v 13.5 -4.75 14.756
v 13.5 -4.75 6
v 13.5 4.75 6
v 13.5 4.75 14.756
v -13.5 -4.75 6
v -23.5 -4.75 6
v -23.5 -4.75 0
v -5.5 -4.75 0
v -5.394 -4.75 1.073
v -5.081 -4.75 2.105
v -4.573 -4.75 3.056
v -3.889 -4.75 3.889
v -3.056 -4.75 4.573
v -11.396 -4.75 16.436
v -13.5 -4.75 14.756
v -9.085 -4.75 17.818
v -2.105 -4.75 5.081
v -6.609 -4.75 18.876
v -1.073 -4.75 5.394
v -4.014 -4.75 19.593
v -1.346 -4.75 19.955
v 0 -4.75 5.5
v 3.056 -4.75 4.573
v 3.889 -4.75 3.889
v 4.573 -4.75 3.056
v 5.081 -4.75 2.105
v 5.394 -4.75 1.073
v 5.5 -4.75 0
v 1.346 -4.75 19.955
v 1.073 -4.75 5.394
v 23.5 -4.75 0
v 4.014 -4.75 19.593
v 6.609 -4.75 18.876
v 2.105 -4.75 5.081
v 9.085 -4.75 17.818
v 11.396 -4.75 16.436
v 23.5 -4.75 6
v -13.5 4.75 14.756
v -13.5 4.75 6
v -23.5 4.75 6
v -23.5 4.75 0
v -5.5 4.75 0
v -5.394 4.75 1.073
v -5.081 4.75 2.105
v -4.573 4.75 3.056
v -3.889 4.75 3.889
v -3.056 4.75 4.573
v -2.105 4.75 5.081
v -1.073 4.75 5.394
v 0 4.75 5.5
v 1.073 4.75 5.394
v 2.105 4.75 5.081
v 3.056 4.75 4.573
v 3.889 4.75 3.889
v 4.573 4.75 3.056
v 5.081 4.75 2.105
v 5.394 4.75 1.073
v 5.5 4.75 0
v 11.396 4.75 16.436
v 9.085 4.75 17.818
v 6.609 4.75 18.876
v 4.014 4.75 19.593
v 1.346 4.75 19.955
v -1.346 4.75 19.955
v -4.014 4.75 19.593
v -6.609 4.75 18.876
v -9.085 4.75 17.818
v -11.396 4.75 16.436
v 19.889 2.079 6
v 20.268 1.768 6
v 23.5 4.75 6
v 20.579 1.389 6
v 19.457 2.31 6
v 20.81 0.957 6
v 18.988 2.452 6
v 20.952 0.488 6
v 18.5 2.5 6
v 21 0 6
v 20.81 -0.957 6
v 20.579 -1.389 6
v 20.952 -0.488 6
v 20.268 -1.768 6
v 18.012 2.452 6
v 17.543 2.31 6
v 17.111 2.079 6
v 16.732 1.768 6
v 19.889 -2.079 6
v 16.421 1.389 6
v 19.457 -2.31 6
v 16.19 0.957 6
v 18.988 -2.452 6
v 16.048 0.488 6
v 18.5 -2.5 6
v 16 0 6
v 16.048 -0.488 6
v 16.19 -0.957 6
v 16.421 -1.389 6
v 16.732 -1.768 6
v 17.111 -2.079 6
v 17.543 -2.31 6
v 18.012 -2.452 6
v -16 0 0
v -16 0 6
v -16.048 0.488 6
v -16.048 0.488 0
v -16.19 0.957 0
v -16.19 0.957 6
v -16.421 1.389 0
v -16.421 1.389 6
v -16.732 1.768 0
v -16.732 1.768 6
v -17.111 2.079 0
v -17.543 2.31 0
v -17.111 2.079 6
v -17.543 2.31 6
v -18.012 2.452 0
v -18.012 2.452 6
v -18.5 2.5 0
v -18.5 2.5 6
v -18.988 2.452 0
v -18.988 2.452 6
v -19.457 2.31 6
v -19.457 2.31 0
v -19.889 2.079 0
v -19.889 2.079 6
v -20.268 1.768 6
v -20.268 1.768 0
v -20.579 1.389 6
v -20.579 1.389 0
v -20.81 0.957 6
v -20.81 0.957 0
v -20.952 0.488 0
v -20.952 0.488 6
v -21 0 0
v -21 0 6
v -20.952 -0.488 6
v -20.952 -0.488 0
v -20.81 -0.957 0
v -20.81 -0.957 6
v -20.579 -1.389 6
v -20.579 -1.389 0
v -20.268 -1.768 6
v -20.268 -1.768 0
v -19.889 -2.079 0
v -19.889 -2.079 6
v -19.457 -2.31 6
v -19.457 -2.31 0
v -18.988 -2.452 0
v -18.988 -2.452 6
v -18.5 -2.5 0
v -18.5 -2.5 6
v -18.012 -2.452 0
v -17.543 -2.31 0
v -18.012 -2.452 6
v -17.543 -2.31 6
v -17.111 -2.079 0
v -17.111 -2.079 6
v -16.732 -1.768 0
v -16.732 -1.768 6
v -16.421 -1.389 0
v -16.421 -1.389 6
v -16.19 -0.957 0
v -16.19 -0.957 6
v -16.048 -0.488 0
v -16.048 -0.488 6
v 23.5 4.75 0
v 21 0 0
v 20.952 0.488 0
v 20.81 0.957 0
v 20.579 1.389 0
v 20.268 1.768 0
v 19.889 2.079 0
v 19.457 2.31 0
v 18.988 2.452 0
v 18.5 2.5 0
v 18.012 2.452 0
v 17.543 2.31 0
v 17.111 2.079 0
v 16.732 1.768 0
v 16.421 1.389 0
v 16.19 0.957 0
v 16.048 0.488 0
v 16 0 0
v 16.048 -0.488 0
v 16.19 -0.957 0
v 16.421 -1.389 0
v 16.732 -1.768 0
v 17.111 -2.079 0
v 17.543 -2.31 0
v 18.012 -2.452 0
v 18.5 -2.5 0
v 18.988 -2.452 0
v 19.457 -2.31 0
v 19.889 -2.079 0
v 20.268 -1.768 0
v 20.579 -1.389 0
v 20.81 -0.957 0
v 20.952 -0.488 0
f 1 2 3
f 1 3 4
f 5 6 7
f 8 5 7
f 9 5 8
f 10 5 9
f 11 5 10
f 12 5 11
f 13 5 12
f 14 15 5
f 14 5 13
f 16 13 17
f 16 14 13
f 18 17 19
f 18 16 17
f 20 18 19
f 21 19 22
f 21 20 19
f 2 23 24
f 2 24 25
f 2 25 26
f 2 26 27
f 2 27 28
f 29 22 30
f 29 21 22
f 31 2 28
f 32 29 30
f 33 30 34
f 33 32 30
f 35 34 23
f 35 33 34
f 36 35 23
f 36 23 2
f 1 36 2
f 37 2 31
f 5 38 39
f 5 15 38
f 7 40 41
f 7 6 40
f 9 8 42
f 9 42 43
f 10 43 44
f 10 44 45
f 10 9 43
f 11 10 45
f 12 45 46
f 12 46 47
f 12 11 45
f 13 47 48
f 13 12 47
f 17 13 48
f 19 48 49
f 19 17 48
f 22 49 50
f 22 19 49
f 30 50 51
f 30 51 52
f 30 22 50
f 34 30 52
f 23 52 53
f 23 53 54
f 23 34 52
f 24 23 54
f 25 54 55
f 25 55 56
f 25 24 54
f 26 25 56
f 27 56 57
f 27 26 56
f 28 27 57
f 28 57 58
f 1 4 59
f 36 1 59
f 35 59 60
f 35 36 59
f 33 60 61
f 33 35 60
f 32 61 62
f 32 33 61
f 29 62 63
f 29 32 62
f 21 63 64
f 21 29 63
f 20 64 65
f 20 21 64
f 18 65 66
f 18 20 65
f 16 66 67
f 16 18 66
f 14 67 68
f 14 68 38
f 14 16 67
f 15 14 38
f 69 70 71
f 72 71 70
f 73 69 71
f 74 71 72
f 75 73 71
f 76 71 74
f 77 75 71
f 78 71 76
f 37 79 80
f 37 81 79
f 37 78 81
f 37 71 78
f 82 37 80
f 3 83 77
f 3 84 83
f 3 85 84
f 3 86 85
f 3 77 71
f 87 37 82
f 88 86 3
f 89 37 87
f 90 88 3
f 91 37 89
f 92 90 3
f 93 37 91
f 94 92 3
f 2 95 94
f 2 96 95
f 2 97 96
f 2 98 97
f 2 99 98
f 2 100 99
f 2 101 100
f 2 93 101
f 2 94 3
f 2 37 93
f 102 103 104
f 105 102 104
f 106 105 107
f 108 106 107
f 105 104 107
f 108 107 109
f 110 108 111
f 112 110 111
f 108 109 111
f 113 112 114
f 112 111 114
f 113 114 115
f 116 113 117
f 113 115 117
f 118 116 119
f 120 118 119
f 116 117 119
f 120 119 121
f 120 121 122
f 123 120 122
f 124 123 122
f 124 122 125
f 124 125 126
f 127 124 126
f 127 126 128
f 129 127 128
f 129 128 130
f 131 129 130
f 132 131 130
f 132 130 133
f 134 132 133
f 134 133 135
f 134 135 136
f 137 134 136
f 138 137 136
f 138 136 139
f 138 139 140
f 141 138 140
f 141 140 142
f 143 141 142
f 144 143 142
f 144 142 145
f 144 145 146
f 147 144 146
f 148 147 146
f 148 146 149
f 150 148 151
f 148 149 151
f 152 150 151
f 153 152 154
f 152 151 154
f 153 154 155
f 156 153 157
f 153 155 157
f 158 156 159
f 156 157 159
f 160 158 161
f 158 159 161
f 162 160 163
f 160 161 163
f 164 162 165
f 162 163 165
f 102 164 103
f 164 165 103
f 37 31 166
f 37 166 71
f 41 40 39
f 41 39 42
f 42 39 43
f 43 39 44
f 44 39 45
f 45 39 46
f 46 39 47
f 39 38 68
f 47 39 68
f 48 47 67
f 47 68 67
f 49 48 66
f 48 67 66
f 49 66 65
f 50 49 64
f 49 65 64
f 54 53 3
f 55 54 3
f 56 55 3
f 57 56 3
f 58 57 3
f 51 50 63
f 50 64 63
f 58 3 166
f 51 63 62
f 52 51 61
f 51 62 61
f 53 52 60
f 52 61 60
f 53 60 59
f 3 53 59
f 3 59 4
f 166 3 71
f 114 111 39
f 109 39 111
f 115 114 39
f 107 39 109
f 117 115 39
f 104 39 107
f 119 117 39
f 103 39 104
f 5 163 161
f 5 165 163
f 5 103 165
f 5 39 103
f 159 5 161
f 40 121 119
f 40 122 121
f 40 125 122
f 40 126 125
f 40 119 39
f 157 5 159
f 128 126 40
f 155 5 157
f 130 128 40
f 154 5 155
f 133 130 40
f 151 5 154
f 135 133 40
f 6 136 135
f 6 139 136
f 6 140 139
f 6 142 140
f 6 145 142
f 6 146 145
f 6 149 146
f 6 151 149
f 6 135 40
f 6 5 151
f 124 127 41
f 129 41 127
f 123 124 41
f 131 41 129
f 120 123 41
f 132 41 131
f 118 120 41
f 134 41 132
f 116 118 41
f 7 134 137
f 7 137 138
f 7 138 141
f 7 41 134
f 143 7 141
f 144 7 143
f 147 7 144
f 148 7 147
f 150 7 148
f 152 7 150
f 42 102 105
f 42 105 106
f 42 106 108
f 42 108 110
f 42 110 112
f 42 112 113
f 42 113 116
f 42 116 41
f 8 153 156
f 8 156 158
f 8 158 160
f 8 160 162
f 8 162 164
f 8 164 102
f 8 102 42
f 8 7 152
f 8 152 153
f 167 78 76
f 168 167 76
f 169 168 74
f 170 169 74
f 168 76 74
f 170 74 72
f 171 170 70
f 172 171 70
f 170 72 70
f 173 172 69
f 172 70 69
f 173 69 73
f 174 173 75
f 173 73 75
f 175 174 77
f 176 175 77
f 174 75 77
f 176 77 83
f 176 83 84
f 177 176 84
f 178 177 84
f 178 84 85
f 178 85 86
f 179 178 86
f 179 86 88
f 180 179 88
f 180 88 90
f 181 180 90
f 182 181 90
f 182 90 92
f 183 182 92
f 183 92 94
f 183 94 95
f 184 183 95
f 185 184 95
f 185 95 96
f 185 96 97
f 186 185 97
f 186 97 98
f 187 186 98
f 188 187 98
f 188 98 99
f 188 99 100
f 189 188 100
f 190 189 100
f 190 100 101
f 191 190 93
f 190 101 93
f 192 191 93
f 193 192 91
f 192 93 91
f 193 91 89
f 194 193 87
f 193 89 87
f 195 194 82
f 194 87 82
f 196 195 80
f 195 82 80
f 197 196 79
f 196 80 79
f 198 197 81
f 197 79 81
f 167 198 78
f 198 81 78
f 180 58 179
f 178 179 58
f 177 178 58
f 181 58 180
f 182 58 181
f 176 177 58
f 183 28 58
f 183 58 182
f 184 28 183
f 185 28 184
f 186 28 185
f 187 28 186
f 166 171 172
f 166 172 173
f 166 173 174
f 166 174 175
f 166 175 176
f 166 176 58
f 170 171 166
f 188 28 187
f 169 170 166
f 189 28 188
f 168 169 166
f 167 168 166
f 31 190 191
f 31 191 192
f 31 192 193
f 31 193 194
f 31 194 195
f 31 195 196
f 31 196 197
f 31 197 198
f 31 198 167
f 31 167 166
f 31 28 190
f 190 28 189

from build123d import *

# Parameters (mm, degrees)
F1_DEPTH = 4.75
F2_R     = 2.5
F3_DEPTH = 6.001


with BuildPart() as f1:
    # F0 (on Front) → F1 (new body, symmetric)
    with BuildSketch(Plane.XZ):
        with BuildLine():
            Line((-23.5, 6), (-23.5, 0))
            Line((-23.5, 0), (-5.5, 0))
            ThreePointArc((-5.5, 0), (0, 5.5), (5.5, 0))
            Line((5.5, 0), (23.5, 0))
            Line((23.5, 0), (23.5, 6))
            Line((23.5, 6), (13.5, 6))
            Line((13.5, 6), (13.5, 14.756355))
            ThreePointArc((13.5, 14.756355), (0, 20), (-13.5, 14.756355))
            Line((-13.5, 14.756355), (-13.5, 6))
            Line((-13.5, 6), (-23.5, 6))
        make_face()
    extrude(amount=F1_DEPTH, both=True)

    # F2 (on face) → F3 (cut, through all)
    with BuildSketch(Plane.XY.offset(6)):
        with Locations((-18.5, 0)):
            Circle(F2_R)
        with Locations((18.5, 0)):
            Circle(F2_R)
    extrude(amount=-F3_DEPTH, mode=Mode.SUBTRACT)


solid = f1.part
